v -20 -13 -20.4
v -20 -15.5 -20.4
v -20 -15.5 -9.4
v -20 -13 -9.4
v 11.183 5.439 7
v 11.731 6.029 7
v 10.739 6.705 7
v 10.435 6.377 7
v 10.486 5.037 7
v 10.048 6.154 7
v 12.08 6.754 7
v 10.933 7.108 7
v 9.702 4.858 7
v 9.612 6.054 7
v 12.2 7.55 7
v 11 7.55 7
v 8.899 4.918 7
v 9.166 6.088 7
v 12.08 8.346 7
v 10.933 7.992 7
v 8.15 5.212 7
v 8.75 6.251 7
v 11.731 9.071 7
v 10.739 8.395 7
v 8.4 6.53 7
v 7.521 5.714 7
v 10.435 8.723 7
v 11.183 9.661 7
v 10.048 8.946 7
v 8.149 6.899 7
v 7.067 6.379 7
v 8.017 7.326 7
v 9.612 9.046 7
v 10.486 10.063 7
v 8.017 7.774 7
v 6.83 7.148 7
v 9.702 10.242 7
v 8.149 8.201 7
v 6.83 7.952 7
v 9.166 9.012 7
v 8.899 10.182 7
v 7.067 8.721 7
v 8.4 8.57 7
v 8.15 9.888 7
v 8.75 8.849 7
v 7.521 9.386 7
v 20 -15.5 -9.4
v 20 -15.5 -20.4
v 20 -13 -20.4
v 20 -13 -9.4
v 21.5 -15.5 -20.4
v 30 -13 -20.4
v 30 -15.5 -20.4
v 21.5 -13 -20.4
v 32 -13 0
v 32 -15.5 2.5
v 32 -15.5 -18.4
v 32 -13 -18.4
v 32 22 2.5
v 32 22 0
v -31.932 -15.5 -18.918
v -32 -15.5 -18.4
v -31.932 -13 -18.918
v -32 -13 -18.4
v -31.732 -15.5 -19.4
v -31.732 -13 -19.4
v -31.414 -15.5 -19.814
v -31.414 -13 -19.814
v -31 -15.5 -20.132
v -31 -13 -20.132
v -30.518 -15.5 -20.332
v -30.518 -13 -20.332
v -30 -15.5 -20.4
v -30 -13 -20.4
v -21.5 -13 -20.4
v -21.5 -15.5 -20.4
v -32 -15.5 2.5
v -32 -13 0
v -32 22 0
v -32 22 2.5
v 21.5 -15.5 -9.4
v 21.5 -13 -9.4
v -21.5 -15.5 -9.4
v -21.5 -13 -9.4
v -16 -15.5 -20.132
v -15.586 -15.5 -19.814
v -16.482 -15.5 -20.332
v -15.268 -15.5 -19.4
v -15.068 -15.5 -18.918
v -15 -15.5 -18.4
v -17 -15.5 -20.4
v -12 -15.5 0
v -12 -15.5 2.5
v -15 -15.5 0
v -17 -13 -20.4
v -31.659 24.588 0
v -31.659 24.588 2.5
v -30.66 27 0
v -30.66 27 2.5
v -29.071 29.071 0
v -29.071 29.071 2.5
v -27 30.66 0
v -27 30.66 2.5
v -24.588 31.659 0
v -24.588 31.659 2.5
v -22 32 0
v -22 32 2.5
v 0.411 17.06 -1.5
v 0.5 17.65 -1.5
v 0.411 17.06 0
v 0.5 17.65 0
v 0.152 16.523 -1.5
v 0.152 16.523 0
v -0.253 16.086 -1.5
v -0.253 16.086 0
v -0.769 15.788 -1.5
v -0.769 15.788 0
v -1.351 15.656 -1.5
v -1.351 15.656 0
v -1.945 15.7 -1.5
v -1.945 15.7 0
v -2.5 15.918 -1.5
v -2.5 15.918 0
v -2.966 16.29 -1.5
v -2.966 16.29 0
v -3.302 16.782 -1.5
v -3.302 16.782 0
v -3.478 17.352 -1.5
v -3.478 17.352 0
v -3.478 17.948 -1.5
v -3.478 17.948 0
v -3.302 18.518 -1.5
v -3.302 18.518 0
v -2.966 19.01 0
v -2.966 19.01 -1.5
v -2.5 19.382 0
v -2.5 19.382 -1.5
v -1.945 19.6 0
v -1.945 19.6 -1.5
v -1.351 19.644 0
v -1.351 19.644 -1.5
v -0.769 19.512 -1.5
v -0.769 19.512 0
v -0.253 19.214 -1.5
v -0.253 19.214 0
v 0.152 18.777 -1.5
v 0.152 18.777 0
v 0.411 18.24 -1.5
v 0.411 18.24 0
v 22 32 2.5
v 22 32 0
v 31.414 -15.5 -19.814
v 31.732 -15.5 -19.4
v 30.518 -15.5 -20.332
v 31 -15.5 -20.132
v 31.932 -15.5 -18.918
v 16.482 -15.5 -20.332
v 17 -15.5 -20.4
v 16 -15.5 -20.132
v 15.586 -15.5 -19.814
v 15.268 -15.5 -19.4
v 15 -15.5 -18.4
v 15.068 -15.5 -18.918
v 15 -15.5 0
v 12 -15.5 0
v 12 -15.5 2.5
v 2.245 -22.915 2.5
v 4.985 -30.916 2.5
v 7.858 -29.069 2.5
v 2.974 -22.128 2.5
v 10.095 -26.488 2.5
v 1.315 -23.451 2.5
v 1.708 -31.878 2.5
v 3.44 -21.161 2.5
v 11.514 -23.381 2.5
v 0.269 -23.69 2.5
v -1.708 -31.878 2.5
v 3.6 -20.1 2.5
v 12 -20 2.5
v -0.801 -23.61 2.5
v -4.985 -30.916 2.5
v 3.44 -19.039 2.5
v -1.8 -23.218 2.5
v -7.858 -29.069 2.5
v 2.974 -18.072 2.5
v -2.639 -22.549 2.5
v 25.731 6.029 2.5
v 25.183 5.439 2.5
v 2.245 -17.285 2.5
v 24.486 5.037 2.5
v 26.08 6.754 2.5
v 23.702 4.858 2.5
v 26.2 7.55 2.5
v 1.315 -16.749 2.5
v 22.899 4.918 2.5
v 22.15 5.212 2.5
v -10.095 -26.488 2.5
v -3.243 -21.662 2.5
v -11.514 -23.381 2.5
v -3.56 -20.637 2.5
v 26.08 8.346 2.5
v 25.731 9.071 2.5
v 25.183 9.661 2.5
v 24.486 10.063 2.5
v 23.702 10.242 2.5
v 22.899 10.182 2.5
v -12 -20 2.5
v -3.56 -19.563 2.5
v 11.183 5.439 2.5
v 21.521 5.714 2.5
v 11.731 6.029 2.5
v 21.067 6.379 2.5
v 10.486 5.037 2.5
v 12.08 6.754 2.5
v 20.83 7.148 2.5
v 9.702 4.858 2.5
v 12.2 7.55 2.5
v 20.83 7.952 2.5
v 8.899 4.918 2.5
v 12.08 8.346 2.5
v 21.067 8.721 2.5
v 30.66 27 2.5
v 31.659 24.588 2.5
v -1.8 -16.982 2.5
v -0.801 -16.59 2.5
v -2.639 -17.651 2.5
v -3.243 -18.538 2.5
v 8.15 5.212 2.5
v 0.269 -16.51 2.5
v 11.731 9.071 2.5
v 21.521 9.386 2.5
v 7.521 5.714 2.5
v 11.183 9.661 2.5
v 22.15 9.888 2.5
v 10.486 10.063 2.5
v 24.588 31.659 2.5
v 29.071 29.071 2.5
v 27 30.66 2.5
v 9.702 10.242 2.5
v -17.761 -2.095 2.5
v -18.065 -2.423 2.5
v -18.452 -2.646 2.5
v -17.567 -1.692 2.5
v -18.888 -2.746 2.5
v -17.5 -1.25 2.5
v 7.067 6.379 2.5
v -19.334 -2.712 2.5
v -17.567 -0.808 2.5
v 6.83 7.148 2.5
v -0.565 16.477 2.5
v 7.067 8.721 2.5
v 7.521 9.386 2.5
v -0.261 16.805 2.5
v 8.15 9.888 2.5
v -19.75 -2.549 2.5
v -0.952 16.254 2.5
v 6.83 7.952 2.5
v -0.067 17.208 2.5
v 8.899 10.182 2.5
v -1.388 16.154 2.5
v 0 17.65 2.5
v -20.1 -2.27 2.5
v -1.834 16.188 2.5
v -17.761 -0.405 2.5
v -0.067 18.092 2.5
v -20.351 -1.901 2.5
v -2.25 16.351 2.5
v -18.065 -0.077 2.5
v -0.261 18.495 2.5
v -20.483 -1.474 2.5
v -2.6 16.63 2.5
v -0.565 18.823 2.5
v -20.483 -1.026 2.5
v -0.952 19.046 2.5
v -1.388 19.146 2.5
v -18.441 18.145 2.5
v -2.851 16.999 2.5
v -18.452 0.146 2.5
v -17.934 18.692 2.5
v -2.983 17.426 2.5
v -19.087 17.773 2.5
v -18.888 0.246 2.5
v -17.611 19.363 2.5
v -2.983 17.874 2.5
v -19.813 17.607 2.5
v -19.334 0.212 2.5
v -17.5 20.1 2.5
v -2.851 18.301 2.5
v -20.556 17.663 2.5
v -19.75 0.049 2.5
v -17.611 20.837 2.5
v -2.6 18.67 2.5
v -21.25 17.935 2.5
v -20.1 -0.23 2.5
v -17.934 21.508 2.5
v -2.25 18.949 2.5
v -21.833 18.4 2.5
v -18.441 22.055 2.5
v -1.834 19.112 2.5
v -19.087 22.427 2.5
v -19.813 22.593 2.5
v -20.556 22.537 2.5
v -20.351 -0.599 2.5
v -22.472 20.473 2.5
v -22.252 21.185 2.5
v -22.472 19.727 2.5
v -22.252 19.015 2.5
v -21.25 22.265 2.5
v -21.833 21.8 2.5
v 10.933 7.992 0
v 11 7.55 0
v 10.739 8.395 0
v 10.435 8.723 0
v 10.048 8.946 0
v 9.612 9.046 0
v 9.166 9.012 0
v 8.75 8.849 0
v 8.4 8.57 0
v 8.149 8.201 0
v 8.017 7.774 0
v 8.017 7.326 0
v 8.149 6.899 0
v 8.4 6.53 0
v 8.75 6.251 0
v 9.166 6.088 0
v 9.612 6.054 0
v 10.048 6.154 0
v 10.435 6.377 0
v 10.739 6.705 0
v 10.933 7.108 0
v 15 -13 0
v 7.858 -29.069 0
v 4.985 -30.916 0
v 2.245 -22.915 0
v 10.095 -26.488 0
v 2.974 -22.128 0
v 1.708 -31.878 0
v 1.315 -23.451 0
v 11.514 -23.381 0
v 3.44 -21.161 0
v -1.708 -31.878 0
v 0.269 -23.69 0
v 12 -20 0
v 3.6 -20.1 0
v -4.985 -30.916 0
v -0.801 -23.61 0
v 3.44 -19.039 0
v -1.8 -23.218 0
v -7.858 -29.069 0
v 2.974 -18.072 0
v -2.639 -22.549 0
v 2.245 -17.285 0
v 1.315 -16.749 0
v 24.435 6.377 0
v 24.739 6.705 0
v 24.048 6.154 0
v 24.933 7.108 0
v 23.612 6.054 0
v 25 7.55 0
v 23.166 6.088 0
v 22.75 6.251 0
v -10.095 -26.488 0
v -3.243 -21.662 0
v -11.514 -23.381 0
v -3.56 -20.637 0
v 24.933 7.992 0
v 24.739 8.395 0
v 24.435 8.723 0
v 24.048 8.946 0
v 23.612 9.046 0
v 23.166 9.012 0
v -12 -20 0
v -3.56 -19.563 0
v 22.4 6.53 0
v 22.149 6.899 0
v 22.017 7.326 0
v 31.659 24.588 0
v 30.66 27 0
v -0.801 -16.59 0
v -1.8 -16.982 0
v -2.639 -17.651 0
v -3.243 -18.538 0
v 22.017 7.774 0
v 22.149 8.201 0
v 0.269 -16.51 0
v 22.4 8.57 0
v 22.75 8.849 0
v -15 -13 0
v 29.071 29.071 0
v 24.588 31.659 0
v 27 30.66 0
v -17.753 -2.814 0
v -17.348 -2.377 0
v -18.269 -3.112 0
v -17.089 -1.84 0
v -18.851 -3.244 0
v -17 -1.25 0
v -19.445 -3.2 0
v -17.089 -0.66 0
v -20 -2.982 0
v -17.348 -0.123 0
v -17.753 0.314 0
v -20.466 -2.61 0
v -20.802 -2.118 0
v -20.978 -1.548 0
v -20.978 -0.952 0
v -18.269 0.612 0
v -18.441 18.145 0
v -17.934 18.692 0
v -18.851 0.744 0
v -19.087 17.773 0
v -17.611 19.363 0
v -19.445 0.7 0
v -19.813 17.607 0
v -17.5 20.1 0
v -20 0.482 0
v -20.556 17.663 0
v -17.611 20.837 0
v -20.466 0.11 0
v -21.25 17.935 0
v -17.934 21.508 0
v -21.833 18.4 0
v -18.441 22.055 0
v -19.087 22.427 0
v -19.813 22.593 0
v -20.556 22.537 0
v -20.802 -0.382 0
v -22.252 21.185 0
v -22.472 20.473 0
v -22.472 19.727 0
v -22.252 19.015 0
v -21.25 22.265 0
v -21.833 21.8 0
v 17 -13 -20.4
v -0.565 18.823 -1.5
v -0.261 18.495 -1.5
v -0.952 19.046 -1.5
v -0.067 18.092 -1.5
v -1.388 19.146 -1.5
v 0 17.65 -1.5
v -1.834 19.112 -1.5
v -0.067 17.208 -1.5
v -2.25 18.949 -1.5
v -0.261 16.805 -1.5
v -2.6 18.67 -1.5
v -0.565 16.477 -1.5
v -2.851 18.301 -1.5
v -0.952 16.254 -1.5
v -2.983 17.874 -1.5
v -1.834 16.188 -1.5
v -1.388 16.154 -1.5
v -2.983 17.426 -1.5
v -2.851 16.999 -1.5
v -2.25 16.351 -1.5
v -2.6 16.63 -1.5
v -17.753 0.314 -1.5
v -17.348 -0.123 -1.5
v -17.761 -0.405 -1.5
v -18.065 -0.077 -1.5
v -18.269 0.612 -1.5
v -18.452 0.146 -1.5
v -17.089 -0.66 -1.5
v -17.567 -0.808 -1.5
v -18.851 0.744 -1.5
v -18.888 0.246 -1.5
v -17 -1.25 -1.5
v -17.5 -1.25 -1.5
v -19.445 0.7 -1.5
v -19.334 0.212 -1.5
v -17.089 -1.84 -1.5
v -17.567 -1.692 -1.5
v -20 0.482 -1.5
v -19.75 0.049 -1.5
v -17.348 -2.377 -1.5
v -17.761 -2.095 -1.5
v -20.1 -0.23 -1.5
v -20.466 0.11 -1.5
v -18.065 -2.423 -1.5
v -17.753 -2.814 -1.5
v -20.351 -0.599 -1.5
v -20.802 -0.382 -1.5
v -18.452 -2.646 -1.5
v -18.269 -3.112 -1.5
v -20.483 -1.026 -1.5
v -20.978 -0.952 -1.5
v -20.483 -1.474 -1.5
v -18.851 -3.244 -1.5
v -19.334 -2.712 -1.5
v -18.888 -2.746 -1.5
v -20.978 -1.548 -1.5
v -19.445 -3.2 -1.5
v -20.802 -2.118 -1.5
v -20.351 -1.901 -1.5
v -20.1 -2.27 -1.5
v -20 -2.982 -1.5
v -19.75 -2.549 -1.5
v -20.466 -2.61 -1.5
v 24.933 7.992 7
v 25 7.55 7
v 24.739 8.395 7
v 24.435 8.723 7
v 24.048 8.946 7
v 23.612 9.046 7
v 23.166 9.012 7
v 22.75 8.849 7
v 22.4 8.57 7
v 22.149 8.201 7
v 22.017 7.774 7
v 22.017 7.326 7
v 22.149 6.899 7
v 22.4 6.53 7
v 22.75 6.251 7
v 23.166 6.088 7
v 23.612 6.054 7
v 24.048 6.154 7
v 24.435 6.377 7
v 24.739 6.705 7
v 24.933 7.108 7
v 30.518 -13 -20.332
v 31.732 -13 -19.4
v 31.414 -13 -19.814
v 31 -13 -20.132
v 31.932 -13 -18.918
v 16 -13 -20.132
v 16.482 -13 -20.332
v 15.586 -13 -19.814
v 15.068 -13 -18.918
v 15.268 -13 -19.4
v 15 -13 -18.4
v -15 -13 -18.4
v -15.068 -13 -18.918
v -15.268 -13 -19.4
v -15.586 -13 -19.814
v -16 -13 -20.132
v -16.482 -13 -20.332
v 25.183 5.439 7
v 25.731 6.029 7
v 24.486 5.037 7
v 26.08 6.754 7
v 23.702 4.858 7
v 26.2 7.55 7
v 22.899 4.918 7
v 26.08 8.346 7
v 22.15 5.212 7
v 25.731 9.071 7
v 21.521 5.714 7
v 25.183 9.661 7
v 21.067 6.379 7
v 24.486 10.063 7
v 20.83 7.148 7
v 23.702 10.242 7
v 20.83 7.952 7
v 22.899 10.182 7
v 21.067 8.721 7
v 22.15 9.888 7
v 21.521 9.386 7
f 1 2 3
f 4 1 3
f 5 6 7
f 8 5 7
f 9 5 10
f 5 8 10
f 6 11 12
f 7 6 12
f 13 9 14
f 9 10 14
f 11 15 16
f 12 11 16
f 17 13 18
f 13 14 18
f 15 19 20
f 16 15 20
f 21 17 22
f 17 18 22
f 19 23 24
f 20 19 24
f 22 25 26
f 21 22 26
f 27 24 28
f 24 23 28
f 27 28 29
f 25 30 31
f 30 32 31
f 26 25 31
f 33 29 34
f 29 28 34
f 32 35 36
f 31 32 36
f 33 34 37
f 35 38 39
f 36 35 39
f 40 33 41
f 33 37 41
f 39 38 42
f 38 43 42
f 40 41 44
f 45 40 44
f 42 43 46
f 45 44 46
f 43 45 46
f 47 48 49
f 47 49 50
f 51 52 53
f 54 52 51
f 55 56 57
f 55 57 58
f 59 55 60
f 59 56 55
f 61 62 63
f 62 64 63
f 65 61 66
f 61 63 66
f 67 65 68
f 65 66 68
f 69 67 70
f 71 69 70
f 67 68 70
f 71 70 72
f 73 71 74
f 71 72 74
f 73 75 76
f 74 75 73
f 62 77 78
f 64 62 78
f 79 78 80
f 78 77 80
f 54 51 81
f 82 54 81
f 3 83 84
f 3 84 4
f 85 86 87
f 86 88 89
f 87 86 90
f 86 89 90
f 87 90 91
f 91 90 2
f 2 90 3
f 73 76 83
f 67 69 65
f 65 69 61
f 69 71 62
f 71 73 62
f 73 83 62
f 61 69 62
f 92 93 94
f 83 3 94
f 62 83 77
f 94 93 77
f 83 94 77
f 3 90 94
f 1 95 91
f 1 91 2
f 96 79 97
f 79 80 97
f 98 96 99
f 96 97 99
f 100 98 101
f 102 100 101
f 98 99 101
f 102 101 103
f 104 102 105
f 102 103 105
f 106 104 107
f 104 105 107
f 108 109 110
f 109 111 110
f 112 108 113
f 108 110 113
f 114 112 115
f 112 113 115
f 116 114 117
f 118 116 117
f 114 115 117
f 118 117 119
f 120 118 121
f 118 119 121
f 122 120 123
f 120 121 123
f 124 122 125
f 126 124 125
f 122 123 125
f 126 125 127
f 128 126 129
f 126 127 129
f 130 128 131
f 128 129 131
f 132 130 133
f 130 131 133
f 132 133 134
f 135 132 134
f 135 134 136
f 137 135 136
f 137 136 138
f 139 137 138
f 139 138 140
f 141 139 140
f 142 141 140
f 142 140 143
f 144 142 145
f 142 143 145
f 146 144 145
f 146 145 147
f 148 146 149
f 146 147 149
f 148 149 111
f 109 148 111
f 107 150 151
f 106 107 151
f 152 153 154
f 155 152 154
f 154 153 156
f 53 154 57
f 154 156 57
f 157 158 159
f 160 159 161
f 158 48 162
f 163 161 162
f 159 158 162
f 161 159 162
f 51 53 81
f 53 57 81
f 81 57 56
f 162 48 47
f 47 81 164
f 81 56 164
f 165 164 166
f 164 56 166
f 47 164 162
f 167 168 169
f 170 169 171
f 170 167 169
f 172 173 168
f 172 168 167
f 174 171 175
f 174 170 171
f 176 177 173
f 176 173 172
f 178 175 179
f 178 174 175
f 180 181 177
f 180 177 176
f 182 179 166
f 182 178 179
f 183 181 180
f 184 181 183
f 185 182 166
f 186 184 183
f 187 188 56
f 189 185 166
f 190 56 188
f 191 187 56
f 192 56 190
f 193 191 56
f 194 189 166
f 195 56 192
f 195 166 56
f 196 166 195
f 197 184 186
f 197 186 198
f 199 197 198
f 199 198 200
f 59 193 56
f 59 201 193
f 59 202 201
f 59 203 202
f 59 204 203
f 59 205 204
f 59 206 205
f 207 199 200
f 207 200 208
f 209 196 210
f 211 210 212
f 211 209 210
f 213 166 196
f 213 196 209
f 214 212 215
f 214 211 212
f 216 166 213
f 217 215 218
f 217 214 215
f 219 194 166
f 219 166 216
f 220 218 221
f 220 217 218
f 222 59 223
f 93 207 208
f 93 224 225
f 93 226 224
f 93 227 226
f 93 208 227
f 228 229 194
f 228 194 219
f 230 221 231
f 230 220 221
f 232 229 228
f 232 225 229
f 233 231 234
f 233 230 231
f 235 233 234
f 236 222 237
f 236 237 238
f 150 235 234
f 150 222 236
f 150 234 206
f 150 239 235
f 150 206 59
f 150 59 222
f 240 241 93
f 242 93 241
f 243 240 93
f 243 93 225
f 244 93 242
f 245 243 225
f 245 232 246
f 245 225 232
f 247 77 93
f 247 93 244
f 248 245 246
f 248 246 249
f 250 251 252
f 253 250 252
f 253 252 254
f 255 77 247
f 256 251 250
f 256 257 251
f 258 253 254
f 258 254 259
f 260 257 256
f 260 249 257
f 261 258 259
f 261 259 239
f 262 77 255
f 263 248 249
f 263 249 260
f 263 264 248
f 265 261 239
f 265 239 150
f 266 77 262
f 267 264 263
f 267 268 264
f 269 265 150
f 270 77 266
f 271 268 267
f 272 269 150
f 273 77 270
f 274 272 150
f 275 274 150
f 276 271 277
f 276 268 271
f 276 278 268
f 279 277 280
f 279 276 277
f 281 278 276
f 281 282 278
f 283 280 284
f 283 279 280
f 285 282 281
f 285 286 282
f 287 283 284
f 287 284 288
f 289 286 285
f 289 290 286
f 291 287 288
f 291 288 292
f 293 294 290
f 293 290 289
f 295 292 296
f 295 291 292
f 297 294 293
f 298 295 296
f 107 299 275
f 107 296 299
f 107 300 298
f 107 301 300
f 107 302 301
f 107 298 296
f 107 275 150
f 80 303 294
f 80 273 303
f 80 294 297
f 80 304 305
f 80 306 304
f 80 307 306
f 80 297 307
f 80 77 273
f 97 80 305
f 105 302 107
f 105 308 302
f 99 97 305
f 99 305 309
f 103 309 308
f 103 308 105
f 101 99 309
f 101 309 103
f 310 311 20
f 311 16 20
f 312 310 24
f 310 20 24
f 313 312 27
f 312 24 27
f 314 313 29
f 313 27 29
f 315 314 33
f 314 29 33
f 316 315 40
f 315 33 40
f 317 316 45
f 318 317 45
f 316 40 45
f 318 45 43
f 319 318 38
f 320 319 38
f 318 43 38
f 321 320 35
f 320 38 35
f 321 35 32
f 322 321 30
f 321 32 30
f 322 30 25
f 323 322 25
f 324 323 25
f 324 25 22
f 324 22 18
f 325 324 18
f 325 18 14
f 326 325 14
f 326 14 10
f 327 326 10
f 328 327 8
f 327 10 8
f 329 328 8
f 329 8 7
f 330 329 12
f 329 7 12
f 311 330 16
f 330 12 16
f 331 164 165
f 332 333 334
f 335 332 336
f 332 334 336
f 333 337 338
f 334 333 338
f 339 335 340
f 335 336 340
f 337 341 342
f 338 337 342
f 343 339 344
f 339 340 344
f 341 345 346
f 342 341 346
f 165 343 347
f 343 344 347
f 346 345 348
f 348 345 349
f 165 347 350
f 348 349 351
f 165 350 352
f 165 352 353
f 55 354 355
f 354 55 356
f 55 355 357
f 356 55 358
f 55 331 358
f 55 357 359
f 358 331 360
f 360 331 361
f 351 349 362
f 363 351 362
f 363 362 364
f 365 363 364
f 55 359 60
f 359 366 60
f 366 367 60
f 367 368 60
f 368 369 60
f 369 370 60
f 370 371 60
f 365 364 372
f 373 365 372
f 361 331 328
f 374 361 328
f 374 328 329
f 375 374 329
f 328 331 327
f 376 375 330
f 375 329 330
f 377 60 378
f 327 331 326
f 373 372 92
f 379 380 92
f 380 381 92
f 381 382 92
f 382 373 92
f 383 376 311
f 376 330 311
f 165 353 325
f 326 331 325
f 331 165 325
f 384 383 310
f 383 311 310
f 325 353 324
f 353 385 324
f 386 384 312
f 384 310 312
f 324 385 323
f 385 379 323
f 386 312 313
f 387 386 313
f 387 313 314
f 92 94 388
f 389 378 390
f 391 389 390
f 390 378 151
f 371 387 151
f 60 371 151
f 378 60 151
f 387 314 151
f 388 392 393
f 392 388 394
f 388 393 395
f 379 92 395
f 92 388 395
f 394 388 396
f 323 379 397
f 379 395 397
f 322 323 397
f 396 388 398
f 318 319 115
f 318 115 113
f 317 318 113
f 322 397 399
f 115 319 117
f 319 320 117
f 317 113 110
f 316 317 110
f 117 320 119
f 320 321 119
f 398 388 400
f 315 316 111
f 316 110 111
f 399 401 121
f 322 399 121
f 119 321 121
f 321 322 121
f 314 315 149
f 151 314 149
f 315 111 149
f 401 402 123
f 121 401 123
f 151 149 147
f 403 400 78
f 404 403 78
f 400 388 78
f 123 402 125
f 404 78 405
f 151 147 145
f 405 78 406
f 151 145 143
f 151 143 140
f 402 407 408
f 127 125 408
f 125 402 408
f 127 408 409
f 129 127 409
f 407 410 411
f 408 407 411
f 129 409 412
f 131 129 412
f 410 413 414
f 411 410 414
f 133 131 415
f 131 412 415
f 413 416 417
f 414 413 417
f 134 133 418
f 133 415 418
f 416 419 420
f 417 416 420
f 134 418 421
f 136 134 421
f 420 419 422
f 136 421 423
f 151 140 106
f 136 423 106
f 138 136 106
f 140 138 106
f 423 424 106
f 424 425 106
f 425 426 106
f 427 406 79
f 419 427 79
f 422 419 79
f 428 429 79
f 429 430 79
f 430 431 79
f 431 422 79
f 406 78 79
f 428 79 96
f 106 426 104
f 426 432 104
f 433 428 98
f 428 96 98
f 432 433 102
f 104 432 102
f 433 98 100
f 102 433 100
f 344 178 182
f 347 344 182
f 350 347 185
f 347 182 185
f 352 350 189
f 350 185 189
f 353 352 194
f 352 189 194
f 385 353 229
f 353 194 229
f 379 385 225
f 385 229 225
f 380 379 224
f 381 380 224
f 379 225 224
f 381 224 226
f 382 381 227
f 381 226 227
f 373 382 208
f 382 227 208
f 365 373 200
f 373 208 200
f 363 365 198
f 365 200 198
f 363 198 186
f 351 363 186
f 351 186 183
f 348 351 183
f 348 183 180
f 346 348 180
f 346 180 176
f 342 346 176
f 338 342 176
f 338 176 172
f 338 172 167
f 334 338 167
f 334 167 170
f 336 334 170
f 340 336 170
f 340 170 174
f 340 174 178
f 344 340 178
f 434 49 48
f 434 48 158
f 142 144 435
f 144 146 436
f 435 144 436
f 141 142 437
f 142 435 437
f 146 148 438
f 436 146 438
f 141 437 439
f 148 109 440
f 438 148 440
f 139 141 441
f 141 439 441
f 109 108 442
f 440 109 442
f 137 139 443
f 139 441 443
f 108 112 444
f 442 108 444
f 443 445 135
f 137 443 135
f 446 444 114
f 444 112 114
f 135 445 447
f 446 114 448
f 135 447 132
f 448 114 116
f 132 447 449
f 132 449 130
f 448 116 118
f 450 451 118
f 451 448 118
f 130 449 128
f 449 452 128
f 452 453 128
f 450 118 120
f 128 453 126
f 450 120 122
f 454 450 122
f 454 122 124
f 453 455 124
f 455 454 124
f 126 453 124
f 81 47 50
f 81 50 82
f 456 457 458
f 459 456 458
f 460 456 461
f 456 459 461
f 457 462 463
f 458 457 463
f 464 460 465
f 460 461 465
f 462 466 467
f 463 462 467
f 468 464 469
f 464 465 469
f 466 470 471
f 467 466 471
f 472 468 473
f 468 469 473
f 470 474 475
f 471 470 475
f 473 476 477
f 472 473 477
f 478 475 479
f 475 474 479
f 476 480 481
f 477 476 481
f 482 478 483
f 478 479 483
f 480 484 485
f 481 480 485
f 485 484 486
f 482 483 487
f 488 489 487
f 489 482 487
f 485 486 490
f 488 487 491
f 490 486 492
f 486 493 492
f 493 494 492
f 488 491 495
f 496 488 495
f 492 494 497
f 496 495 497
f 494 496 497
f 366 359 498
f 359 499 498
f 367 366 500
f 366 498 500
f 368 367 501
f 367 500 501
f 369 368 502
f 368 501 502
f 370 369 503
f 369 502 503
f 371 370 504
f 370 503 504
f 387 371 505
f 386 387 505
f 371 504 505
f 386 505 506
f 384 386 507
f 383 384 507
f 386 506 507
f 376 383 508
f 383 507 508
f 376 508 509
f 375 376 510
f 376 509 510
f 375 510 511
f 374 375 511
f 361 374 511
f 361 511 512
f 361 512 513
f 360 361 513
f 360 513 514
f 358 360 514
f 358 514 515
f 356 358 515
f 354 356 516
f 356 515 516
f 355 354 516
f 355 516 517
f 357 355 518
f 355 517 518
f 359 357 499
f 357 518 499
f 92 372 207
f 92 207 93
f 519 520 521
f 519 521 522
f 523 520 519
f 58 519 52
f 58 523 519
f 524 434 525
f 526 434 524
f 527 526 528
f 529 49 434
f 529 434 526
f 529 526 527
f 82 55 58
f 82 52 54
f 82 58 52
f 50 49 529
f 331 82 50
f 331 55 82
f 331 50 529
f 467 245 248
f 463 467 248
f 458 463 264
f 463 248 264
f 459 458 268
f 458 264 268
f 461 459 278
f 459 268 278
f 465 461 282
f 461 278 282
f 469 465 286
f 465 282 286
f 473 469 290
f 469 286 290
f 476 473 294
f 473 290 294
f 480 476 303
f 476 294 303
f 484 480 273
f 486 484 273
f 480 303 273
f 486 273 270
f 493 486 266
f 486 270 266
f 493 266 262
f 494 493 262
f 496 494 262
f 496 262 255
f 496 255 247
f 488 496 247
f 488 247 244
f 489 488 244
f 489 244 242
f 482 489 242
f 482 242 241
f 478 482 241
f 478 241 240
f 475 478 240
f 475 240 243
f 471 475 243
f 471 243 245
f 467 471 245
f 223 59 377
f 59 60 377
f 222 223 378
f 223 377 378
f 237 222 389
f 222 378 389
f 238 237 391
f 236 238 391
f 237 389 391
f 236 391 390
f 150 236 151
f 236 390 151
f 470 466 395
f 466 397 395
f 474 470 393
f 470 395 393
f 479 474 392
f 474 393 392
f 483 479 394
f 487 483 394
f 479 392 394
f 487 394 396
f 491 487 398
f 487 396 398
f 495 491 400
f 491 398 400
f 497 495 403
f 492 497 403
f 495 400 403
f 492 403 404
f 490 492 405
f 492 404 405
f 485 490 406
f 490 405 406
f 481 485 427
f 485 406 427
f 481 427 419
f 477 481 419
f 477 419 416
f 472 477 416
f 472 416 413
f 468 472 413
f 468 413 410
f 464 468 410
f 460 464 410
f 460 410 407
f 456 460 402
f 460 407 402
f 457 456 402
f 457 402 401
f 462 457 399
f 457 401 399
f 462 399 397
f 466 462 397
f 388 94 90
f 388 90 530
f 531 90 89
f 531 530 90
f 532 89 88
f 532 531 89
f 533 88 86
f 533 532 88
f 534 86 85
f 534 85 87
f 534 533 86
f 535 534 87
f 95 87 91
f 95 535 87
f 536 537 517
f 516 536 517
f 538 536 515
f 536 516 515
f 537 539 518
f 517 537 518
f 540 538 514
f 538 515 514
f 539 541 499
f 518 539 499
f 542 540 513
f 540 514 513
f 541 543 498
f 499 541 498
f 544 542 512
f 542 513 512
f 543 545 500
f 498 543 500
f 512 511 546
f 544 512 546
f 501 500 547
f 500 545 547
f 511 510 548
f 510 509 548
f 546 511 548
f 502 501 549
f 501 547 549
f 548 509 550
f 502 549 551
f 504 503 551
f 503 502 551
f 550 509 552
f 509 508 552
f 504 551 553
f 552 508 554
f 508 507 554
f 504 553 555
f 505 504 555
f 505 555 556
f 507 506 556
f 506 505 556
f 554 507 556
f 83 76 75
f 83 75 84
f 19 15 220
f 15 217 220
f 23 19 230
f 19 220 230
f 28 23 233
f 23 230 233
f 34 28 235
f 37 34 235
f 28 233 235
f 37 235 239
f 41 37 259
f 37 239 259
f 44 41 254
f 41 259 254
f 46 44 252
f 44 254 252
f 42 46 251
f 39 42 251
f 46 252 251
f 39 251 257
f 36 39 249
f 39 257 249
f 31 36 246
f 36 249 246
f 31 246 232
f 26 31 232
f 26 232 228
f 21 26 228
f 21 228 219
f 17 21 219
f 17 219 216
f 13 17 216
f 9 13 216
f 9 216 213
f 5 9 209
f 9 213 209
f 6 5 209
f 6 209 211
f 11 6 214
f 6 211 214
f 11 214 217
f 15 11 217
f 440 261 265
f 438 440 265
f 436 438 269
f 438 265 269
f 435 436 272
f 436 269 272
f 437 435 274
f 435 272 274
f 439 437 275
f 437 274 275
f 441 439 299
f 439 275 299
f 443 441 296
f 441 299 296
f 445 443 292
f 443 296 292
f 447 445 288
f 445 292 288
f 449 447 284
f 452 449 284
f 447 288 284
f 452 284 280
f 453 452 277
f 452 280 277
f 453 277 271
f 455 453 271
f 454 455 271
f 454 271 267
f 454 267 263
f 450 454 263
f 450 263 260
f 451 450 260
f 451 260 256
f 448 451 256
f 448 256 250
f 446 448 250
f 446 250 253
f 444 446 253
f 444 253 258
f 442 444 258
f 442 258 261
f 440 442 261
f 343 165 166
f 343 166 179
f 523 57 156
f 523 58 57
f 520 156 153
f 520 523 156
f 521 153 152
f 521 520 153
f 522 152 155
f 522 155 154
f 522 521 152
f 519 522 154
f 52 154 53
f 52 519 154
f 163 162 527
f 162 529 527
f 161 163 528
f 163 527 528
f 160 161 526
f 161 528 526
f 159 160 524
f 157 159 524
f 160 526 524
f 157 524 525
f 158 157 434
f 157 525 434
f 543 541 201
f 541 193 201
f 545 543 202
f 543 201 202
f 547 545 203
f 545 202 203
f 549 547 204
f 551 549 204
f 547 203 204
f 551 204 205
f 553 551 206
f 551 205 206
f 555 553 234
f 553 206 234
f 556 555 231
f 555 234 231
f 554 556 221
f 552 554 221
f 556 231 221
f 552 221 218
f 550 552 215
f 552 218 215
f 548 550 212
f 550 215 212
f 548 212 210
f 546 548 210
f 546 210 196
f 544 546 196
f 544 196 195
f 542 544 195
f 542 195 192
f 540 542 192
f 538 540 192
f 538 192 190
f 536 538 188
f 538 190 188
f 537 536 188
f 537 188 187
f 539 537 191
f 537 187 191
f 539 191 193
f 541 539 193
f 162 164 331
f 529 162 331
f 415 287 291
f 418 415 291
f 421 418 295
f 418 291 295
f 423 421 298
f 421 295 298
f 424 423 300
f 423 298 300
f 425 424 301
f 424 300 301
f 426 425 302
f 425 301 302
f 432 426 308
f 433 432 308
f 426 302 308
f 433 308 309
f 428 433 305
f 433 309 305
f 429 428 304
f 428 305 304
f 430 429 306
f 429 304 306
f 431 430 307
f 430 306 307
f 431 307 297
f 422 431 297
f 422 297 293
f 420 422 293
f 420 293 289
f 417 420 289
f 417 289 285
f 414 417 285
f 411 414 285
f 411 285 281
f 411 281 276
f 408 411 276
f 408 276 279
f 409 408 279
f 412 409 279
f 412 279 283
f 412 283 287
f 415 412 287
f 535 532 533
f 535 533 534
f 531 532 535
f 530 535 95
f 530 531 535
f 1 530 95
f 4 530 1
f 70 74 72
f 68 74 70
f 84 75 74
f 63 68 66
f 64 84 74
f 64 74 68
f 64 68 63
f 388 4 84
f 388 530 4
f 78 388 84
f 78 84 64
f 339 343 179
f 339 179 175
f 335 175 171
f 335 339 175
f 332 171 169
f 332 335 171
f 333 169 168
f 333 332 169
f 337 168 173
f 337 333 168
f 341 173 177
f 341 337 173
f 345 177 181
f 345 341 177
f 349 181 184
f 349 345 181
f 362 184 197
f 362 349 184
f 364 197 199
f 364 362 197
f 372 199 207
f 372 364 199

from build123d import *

# Parameters (mm, degrees)
BOSS_EXTRUDE1_DEPTH     = 2.5
SKETCH2_W               = 2.5
SKETCH2_H               = 47.5
BOSS_EXTRUDE2_DEPTH     = 20
SKETCH3_W               = 2.5
SKETCH3_H               = 47.5
BOSS_EXTRUDE3_DEPTH     = 20
SKETCH4_W               = 17
SKETCH4_H               = 2.5
BOSS_EXTRUDE4_DEPTH     = 20.4
SKETCH5_W               = 1.5
SKETCH5_H               = 11
CUT_EXTRUDE1_DEPTH      = 48.5
SKETCH6_W               = 17
SKETCH6_H               = 2.5
BOSS_EXTRUDE5_DEPTH     = 20.4
SKETCH7_W               = 1.5
SKETCH7_H               = 11
CUT_EXTRUDE2_DEPTH      = 48.5
SKETCH8_W               = 2.7
SKETCH8_H               = 4.5
SKETCH9_W               = 2.7
SKETCH9_H               = 4.5
SKETCH10_W              = 2
SKETCH10_H              = 1.5
SKETCH11_W              = 2
SKETCH11_H              = 1.5
FILLET1_R               = 2
FILLET2_R               = 10
SKETCH13_R              = 3.6
SKETCH13_R_2            = 2.5
SKETCH13_R_3            = 1.5
CUT_EXTRUDE3_DEPTH      = 5.5
CUT_EXTRUDE3_DEPTH_BACK = 23.9


with BuildPart() as part:
    # Sketch1 → Boss-Extrude1 (new body)
    with BuildSketch(Plane(origin=(0, 0, 0), x_dir=(-1, 0, 0), z_dir=(0, 0, -1))):
        with BuildLine():
            Line((12, -20), (12, 32))
            Line((12, 32), (-12, 32))
            Line((-12, 32), (-12, -20))
            ThreePointArc((-12, -20), (0, -32), (12, -20))
        make_face()
    extrude(amount=-BOSS_EXTRUDE1_DEPTH)

    # Sketch2 → Boss-Extrude2 (add)
    with BuildSketch(Plane.ZY.offset(12)):
        with Locations((1.25, 8.25)):
            Rectangle(SKETCH2_W, SKETCH2_H)
    extrude(amount=BOSS_EXTRUDE2_DEPTH)

    # Sketch3 → Boss-Extrude3 (add)
    with BuildSketch(Plane(origin=(12, 0, 0), x_dir=(0, 0, -1), z_dir=(1, 0, 0))):
        with Locations((-1.25, 8.25)):
            Rectangle(SKETCH3_W, SKETCH3_H)
    extrude(amount=BOSS_EXTRUDE3_DEPTH)

    # Sketch4 → Boss-Extrude4 (add)
    with BuildSketch(Plane(origin=(0, 0, 0), x_dir=(-1, 0, 0), z_dir=(0, 0, -1))):
        with Locations((-23.5, -14.25)):
            Rectangle(SKETCH4_W, SKETCH4_H)
    extrude(amount=BOSS_EXTRUDE4_DEPTH)

    # Sketch5 → Cut-Extrude1 (cut, through all)
    with BuildSketch(Plane.XZ.offset(15.5)):
        with Locations((20.75, -14.9)):
            Rectangle(SKETCH5_W, SKETCH5_H)
    extrude(amount=-CUT_EXTRUDE1_DEPTH, mode=Mode.SUBTRACT)

    # Sketch6 → Boss-Extrude5 (add)
    with BuildSketch(Plane(origin=(0, 0, 0), x_dir=(-1, 0, 0), z_dir=(0, 0, -1))):
        with Locations((23.5, -14.25)):
            Rectangle(SKETCH6_W, SKETCH6_H)
    extrude(amount=BOSS_EXTRUDE5_DEPTH)

    # Sketch7 → Cut-Extrude2 (cut, through all)
    with BuildSketch(Plane.XZ.offset(15.5)):
        with Locations((-20.75, -14.9)):
            Rectangle(SKETCH7_W, SKETCH7_H)
    extrude(amount=-CUT_EXTRUDE2_DEPTH, mode=Mode.SUBTRACT)

    # Sketch8 → Revolve1 (revolve)
    with BuildSketch(Plane(origin=(0, 7.55, 0), x_dir=(1, 0, 0), z_dir=(0, 1, 0))):
        with Locations((10.85, -4.75)):
            Rectangle(SKETCH8_W, SKETCH8_H)
    revolve(axis=Axis((9.5, 7.55, 2.5), (0, 0, 1)))

    # Sketch9 → Revolve2 (revolve)
    with BuildSketch(Plane(origin=(0, 7.55, 0), x_dir=(1, 0, 0), z_dir=(0, 1, 0))):
        with Locations((24.85, -4.75)):
            Rectangle(SKETCH9_W, SKETCH9_H)
    revolve(axis=Axis((23.5, 7.55, 2.5), (0, 0, 1)))

    # Sketch10 → Revolve3 (revolve)
    with BuildSketch(Plane.XZ.offset(1.25)):
        with Locations((-18, -0.75)):
            Rectangle(SKETCH10_W, SKETCH10_H)
    revolve(axis=Axis((-19, -1.25, 0), (0, 0, -1)))

    # Sketch11 → Revolve4 (revolve)
    with BuildSketch(Plane.XZ.offset(-17.65)):
        with Locations((-0.5, -0.75)):
            Rectangle(SKETCH11_W, SKETCH11_H)
    revolve(axis=Axis((-1.5, 17.65, 0), (0, 0, -1)))

    # Fillet1
    fillet1_edges = [part.edges().sort_by_distance(p)[0] for p in [
        (32, -14.25, -20.4),
        (15, -14.25, -20.4),
        (-15, -14.25, -20.4),
        (-32, -14.25, -20.4),
    ]]
    fillet(fillet1_edges, radius=FILLET1_R)

    # Fillet2
    fillet2_edges = [part.edges().sort_by_distance(p)[0] for p in [
        (-32, 32, 1.25),
        (32, 32, 1.25),
    ]]
    fillet(fillet2_edges, radius=FILLET2_R)

    # Sketch13 → Cut-Extrude3 (cut, two sides)
    with BuildSketch(Plane.XY.offset(2.5)) as cut_extrude3_sk:
        with Locations((0, -20.1)):
            Circle(SKETCH13_R)
        with Locations((-20, 20.1)):
            Circle(SKETCH13_R_2)
        with Locations((-1.5, 17.65)):
            Circle(SKETCH13_R_3)
        with Locations((-19, -1.25)):
            Circle(SKETCH13_R_3)
        with Locations((9.5, 7.55)):
            Circle(SKETCH13_R_3)
        with Locations((23.5, 7.55)):
            Circle(SKETCH13_R_3)
    extrude(amount=CUT_EXTRUDE3_DEPTH, mode=Mode.SUBTRACT)
    extrude(cut_extrude3_sk.sketch, amount=-CUT_EXTRUDE3_DEPTH_BACK, mode=Mode.SUBTRACT)


solid = part.part
